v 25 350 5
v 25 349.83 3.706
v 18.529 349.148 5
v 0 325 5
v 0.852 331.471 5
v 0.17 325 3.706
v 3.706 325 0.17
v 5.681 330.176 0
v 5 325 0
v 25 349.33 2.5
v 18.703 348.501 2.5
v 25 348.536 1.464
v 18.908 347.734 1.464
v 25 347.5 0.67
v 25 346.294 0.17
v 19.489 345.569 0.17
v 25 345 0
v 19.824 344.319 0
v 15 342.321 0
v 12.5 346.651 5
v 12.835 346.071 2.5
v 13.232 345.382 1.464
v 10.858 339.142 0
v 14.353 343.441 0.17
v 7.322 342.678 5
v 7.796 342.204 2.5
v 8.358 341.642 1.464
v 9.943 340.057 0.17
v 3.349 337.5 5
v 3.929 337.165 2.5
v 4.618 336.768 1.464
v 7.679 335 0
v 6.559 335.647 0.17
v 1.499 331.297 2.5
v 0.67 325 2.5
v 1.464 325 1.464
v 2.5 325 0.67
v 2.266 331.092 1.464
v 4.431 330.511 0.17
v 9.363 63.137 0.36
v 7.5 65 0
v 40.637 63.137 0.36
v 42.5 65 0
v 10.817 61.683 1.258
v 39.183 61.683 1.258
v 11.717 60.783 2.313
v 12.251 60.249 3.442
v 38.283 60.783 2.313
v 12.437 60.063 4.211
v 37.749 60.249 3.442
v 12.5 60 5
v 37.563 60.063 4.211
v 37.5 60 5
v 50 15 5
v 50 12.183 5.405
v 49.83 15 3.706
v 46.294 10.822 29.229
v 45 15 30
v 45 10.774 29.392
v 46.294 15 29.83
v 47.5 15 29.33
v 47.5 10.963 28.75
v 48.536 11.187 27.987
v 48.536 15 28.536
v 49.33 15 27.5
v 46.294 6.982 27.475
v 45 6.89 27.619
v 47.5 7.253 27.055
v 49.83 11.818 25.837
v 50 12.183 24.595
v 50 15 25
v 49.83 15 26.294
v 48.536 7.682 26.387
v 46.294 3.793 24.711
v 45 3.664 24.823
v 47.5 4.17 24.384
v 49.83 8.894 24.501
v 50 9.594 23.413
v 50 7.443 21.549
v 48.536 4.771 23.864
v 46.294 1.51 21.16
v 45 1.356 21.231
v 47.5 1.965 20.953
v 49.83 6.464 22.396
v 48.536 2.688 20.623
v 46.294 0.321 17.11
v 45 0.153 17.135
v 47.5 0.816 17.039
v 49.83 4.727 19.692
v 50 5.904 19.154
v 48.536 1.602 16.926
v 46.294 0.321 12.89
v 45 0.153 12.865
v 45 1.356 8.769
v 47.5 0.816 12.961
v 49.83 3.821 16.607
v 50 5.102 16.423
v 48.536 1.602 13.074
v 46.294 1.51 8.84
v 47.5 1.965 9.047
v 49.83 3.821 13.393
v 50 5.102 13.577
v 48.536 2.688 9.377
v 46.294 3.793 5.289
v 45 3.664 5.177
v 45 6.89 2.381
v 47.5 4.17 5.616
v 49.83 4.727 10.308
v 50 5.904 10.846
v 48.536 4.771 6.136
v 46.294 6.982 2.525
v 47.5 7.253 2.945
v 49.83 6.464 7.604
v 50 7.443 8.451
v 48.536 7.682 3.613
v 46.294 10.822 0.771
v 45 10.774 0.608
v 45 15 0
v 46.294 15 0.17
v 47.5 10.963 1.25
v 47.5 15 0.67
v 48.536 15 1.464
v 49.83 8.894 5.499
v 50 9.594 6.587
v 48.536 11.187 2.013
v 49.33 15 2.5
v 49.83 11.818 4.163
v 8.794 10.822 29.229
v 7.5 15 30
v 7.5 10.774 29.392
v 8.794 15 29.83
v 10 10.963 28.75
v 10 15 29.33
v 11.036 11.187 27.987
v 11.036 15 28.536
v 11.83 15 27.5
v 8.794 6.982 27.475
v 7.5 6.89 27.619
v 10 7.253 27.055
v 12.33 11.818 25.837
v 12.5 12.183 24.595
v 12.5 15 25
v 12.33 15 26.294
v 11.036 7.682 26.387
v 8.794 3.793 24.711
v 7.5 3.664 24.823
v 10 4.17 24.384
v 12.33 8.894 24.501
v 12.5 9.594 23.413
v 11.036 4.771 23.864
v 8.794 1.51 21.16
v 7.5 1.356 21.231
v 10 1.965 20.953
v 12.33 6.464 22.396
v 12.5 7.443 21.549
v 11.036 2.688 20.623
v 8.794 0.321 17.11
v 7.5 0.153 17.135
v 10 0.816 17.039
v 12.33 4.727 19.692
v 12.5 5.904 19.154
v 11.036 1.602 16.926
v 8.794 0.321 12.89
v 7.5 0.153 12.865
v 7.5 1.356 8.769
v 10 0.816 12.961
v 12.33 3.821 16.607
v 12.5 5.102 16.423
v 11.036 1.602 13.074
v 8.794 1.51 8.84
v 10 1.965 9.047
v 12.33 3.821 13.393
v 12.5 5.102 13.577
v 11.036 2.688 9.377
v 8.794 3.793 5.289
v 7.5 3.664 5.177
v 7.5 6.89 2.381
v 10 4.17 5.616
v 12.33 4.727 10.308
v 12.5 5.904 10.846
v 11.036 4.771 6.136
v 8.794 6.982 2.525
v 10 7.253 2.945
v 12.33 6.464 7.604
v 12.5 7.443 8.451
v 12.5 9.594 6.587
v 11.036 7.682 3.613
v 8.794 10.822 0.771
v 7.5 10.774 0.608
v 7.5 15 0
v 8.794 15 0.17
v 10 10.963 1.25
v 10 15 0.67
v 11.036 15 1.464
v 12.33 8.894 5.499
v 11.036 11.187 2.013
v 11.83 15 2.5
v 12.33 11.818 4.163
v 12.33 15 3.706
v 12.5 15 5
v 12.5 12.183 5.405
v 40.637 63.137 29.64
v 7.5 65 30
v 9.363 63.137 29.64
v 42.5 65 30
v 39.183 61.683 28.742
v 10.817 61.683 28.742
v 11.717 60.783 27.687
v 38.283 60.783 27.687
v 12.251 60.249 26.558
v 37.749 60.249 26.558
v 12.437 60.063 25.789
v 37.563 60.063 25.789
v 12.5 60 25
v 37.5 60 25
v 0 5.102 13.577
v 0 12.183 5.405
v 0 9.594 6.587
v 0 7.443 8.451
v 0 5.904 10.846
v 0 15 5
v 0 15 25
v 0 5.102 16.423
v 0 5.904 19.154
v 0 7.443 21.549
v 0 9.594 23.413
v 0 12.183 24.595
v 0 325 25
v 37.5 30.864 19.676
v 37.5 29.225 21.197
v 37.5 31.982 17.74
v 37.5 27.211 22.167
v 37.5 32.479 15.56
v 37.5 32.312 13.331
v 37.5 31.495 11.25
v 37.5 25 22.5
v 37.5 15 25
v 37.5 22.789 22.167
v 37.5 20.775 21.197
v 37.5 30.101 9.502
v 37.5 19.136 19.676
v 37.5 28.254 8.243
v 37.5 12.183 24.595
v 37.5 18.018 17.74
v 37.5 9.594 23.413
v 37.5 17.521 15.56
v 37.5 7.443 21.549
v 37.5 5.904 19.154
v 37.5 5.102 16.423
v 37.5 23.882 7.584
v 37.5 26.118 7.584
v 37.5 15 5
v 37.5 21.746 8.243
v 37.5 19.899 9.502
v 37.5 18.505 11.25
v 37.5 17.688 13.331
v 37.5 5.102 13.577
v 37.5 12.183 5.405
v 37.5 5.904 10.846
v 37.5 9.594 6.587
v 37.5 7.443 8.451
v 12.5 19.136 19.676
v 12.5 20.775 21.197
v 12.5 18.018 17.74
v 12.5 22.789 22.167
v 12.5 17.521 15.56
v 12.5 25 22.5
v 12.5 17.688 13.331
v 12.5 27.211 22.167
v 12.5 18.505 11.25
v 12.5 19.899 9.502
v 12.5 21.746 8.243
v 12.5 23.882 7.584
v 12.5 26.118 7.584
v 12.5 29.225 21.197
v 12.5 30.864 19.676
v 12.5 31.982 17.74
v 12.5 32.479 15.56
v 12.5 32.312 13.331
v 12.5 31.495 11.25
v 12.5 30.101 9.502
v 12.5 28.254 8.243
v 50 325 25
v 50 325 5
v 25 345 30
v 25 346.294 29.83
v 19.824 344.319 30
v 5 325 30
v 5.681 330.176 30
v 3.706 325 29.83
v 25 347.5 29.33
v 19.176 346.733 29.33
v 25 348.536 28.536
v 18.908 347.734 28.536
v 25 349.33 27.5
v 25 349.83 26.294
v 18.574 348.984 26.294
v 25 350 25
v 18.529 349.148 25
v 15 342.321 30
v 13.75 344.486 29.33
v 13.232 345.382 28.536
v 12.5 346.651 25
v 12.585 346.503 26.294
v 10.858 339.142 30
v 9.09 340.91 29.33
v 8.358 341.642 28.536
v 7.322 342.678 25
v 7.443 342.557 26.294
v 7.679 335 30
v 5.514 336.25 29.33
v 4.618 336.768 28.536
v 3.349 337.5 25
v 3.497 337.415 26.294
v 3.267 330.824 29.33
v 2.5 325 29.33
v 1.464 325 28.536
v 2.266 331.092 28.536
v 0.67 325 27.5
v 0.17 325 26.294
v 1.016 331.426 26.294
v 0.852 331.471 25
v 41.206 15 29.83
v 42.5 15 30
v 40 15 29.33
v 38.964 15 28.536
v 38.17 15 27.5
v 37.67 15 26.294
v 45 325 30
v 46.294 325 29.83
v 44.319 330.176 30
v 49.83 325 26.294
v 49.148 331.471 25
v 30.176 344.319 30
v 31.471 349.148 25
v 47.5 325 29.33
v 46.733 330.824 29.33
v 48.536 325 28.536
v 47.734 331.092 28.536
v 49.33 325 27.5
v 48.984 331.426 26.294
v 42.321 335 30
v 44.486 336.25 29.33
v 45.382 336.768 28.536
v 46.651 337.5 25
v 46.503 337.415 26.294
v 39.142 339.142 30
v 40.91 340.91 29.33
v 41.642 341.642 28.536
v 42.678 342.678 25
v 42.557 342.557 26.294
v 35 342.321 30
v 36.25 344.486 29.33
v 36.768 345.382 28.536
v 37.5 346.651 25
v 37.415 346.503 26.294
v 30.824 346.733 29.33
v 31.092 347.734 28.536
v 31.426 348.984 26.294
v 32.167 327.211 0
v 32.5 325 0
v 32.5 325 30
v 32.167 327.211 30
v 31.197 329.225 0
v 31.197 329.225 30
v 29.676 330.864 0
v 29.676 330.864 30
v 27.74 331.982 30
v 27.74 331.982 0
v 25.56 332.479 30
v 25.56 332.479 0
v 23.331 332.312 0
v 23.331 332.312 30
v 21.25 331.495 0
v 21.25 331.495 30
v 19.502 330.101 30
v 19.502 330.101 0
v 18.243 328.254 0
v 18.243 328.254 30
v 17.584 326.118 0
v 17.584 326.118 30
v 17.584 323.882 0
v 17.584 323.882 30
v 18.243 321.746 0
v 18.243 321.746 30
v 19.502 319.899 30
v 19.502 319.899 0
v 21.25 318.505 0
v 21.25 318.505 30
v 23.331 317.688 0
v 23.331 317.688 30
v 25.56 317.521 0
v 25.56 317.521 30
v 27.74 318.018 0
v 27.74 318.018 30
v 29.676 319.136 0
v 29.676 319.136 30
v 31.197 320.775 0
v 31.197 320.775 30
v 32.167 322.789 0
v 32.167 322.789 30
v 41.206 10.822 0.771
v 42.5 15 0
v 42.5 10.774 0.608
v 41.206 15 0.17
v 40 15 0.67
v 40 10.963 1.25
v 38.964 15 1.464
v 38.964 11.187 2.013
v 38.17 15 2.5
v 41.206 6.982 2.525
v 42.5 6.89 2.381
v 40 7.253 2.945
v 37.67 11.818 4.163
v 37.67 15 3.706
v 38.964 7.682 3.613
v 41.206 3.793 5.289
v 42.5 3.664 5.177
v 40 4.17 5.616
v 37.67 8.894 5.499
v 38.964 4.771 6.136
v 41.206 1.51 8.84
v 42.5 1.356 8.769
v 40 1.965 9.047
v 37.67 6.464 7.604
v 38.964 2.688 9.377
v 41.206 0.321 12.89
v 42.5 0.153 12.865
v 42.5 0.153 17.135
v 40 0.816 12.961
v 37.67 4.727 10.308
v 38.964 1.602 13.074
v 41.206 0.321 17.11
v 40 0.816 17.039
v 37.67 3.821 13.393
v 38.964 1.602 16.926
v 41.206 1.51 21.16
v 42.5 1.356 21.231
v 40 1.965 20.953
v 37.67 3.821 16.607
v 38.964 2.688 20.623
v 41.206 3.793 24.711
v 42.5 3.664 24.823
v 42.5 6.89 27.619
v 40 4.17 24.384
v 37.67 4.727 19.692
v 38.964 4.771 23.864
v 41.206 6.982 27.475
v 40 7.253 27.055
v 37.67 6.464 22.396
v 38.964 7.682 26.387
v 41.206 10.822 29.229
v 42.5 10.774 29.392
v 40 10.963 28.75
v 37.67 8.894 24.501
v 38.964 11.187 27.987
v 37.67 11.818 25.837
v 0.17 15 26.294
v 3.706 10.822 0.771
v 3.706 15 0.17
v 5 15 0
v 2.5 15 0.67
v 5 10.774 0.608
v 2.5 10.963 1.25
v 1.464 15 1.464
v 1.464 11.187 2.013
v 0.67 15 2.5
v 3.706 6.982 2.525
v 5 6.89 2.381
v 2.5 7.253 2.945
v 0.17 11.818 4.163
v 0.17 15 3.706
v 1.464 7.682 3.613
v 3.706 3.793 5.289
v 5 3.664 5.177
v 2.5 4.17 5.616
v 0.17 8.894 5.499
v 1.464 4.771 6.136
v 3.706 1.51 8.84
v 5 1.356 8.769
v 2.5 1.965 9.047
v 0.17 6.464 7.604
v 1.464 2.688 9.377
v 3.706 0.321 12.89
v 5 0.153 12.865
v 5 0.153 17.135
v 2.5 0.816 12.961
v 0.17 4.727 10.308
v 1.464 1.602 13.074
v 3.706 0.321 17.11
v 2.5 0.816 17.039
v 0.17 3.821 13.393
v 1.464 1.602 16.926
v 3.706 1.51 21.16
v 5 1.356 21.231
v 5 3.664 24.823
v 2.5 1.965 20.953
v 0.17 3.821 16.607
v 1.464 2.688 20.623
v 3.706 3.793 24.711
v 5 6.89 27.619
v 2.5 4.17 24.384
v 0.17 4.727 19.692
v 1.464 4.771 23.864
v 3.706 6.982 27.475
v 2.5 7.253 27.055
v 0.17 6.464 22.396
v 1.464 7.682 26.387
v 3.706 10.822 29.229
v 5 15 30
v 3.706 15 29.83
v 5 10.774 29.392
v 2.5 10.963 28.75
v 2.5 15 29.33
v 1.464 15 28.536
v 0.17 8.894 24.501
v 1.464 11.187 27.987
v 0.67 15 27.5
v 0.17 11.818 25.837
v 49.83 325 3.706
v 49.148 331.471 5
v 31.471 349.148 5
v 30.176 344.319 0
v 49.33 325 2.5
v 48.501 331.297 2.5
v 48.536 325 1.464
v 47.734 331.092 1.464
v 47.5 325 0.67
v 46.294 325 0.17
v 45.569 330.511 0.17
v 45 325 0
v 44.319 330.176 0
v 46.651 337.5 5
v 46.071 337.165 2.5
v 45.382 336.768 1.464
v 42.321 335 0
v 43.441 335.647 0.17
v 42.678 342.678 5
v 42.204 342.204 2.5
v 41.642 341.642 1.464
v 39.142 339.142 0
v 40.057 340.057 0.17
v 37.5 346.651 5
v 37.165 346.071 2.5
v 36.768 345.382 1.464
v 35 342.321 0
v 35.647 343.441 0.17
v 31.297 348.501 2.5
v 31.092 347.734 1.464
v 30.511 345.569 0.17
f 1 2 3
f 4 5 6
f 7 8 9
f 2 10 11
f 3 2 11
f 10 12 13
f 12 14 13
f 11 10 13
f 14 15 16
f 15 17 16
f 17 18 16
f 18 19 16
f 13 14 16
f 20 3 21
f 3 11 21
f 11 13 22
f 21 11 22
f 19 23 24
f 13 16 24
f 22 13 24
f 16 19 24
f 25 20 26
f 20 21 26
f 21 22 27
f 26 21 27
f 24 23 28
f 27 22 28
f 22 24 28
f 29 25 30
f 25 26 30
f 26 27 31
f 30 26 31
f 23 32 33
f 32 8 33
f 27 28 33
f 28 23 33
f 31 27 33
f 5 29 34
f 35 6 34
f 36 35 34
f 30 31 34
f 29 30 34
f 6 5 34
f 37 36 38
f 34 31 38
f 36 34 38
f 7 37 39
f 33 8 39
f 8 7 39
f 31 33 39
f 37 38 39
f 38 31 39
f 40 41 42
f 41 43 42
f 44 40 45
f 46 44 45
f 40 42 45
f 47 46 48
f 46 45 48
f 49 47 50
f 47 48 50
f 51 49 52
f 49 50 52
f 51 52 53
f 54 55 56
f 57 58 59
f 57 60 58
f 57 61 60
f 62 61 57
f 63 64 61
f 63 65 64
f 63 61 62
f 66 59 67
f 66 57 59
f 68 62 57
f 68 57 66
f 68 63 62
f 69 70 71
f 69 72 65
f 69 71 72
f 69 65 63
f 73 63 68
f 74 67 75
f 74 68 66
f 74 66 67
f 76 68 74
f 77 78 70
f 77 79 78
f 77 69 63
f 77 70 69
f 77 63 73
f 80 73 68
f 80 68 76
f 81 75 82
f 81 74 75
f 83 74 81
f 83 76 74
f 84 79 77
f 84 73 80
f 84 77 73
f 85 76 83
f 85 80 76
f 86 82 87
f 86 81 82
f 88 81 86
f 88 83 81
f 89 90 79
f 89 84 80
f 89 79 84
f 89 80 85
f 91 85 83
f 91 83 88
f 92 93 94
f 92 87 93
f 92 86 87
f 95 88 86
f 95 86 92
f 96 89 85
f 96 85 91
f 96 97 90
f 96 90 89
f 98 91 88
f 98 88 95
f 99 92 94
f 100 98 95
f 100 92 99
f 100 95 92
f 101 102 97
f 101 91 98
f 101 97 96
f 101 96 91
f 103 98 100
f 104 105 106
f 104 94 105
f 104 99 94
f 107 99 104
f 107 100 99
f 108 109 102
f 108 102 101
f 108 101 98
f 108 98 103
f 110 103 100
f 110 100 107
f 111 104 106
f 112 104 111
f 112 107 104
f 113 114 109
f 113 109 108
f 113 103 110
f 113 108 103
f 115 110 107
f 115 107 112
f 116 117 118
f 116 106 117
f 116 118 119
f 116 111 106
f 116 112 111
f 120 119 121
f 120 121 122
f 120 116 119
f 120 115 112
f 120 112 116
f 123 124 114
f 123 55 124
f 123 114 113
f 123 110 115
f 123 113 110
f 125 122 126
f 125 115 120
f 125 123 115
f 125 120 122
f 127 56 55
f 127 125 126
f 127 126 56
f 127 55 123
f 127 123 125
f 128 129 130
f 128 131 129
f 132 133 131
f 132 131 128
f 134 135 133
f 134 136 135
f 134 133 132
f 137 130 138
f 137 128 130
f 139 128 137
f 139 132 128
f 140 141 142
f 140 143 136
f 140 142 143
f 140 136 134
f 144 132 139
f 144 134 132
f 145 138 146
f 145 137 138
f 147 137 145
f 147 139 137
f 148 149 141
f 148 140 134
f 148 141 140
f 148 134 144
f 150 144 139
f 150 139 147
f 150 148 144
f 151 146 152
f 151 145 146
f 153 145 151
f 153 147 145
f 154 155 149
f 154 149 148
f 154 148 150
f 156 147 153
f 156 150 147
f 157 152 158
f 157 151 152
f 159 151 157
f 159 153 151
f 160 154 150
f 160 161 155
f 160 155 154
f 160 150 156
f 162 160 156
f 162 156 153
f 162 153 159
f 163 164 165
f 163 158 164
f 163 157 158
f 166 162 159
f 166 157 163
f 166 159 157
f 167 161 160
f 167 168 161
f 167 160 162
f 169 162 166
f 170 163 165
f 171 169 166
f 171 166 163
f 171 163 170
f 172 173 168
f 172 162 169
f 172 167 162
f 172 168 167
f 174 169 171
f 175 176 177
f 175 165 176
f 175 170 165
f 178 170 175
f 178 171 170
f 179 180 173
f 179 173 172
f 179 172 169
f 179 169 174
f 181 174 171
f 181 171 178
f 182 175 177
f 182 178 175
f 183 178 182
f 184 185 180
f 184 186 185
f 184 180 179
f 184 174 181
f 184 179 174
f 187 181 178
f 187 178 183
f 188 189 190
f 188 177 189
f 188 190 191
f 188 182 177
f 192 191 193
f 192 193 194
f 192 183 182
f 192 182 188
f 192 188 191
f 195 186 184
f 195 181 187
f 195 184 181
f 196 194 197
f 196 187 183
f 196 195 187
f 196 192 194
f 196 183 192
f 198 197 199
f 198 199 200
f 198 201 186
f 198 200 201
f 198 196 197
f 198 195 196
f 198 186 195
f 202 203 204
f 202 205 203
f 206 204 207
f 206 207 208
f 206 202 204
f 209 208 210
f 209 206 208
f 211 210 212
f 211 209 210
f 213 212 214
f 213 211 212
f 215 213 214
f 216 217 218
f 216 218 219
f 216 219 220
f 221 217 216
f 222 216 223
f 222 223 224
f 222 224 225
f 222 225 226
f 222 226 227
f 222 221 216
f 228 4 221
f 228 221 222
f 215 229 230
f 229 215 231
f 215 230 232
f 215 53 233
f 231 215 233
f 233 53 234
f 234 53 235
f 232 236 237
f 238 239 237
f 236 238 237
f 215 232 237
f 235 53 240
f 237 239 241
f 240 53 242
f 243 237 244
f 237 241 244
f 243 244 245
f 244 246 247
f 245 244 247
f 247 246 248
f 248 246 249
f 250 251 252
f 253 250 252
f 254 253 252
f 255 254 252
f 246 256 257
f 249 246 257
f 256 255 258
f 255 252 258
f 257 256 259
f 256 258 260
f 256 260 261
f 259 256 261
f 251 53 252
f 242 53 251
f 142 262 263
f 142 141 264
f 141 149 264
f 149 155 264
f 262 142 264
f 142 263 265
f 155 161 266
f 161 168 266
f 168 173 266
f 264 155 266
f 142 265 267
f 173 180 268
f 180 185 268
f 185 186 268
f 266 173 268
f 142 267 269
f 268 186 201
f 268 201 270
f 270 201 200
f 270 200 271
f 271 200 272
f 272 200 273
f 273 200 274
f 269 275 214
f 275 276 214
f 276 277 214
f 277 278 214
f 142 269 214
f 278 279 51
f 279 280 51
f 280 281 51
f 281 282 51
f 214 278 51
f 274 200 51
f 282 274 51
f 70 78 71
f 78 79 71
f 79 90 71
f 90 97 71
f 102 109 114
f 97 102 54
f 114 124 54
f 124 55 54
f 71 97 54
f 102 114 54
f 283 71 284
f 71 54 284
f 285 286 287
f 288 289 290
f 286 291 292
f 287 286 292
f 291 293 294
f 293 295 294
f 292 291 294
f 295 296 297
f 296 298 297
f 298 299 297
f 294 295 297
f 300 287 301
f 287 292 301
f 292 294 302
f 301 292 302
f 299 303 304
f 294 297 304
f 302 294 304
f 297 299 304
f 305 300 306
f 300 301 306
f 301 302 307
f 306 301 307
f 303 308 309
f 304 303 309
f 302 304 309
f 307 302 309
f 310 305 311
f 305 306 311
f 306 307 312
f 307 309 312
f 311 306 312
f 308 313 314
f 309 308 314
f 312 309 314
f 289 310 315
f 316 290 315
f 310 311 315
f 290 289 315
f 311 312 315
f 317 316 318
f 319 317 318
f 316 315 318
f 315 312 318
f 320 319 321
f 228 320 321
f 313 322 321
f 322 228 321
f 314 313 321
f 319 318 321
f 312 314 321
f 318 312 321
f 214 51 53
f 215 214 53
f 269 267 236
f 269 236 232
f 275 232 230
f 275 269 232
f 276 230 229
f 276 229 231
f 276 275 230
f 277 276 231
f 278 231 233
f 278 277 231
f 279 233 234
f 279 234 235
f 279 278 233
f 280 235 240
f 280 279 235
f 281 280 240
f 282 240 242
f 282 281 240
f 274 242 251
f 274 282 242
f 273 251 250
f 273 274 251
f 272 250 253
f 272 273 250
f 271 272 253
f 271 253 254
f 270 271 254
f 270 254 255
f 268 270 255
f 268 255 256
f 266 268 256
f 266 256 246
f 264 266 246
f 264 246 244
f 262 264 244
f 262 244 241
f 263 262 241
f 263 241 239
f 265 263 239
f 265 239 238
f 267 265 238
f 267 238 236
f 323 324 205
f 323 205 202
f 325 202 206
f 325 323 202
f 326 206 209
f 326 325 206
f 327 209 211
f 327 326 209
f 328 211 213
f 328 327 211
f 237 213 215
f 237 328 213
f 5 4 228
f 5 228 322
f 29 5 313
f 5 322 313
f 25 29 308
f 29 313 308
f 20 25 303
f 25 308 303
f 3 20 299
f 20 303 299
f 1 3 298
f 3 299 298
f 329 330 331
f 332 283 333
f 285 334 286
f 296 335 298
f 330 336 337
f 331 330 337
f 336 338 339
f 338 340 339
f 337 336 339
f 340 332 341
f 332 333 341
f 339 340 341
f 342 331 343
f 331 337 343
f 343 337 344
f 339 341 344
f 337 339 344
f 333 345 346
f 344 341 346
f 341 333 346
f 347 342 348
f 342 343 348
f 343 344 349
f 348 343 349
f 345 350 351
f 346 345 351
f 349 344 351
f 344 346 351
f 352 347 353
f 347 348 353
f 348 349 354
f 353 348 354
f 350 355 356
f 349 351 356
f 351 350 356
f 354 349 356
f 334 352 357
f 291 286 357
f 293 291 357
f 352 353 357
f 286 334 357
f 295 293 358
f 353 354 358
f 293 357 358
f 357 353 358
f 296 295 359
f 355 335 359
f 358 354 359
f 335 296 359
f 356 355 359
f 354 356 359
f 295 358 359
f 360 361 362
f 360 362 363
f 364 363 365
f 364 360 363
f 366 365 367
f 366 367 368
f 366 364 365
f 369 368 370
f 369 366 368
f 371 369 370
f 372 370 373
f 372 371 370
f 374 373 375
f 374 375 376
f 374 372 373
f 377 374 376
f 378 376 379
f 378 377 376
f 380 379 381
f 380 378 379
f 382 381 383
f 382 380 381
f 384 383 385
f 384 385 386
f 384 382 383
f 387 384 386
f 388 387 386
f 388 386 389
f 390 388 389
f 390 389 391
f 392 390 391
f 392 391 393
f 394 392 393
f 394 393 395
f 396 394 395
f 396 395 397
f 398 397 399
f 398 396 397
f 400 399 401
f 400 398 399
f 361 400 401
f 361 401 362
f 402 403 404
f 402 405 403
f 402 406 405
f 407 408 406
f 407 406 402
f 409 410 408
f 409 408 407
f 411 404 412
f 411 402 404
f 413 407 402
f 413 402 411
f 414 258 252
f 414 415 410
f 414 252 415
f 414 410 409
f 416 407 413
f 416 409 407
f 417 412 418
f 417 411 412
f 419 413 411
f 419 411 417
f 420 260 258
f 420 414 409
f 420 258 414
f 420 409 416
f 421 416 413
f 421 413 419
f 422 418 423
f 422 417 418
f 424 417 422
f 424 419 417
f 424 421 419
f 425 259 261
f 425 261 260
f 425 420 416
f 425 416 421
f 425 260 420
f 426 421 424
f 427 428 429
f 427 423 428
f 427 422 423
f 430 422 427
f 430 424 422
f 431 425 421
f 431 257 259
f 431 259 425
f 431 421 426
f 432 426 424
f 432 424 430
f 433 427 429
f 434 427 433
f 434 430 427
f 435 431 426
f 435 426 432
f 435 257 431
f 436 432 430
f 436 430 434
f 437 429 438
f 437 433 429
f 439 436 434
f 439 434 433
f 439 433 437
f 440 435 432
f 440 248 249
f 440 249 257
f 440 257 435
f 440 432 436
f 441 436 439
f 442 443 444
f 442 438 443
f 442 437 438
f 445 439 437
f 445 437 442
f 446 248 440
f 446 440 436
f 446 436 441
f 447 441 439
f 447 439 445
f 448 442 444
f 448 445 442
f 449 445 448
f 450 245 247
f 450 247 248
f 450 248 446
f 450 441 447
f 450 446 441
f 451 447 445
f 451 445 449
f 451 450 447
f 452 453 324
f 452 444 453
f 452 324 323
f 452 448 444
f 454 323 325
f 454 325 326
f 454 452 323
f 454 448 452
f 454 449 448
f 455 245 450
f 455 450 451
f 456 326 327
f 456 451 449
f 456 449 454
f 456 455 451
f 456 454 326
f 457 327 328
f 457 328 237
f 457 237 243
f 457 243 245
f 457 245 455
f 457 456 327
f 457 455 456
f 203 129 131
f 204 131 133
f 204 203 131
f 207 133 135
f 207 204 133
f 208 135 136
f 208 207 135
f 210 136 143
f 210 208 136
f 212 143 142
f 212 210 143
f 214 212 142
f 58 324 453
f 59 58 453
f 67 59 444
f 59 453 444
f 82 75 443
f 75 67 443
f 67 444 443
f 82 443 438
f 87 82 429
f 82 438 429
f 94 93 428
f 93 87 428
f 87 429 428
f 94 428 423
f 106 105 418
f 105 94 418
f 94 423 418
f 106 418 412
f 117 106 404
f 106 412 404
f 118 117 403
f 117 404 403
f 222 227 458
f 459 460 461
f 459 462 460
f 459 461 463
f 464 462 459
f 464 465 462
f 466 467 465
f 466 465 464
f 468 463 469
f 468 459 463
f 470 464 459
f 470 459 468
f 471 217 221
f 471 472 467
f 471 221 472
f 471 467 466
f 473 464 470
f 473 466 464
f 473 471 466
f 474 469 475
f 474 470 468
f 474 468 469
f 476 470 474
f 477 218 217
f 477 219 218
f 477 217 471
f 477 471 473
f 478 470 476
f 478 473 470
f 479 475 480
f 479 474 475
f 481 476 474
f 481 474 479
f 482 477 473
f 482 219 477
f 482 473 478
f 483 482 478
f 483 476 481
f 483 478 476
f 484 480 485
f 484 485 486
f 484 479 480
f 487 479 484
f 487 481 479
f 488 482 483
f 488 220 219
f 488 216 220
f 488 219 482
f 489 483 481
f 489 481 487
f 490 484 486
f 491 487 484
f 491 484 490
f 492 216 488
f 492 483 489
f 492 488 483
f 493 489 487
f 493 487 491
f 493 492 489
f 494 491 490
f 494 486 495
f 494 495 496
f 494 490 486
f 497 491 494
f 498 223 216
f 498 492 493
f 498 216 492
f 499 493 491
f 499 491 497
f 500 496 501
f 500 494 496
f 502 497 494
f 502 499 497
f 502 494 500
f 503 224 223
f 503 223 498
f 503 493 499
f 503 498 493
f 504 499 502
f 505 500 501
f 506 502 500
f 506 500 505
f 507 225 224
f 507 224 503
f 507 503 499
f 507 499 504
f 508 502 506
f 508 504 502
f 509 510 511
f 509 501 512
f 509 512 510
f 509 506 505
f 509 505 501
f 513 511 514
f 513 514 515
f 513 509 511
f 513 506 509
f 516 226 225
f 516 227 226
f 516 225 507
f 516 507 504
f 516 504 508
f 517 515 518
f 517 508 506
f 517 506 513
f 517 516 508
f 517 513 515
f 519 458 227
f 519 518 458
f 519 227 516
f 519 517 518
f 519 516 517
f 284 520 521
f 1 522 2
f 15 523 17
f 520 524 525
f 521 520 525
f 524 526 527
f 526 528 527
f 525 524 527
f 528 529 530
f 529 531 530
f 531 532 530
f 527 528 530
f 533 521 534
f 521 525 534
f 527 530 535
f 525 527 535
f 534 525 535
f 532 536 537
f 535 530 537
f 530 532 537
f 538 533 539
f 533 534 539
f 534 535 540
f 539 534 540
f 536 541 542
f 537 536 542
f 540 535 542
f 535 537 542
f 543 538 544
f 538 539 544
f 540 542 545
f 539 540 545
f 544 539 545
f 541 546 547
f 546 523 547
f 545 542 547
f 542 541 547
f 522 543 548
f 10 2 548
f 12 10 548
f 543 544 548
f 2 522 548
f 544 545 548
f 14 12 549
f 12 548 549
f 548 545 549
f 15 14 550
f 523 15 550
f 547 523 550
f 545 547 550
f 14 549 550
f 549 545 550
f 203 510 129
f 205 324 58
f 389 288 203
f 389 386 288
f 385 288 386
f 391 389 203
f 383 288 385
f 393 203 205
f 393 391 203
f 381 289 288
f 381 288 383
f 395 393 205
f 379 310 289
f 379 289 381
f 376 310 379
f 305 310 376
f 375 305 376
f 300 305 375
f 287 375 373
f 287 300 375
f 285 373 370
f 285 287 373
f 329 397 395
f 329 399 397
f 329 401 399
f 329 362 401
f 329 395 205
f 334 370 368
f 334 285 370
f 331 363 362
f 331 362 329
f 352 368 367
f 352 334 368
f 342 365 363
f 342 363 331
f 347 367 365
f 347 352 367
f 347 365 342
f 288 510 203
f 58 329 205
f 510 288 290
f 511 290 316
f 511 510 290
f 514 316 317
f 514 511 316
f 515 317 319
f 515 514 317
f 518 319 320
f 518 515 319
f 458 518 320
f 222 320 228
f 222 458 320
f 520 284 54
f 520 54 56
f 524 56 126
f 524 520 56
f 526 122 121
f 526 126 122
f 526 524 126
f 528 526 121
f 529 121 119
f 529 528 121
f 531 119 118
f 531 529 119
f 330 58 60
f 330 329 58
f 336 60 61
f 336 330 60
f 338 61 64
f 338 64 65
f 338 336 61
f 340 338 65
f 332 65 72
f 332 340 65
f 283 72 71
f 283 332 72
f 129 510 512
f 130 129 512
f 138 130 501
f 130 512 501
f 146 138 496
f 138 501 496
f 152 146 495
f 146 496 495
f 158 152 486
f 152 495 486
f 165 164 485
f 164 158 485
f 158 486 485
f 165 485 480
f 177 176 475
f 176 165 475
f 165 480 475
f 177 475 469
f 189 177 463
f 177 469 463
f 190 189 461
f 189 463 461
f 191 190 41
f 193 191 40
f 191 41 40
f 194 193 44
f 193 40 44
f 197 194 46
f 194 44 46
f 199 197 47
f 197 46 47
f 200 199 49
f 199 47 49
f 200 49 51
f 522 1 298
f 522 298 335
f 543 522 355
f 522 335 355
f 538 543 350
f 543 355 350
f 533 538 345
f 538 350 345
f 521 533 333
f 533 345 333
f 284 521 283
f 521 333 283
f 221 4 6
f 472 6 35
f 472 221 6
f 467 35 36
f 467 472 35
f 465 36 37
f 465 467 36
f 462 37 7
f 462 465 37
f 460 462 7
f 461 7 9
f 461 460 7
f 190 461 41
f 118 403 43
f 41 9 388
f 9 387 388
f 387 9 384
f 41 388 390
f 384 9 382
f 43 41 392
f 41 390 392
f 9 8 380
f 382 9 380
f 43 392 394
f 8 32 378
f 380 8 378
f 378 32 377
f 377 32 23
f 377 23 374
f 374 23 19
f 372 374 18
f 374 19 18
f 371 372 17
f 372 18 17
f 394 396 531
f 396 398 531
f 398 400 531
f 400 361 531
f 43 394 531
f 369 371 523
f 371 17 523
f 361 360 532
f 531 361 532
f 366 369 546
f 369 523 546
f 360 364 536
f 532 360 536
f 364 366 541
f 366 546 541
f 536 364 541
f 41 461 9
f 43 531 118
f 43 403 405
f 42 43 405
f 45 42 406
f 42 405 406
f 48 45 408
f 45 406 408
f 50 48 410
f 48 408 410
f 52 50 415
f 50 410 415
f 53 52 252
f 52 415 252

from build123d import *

# Parameters (mm, degrees)
CROQUIS1_R              = 7.5
SALIENTE_EXTRUIR2_DEPTH = 30
REDONDEO1_R             = 25
CROQUIS2_R              = 7.5
SALIENTE_EXTRUIR3_DEPTH = 50
REDONDEO2_R             = 5
REDONDEO4_R             = 15


# Some blends are built 0.0001 mm under size
with BuildPart() as part:
    # Croquis1 → Saliente-Extruir2 (new body)
    with BuildSketch(Plane.XY):
        Polygon((12.5, 0), (12.5, 60), (37.5, 60), (37.5, 0), (50, 0), (50, 350), (0, 350), (0, 0), align=None)
        with Locations((25, 325)):
            Circle(CROQUIS1_R, mode=Mode.SUBTRACT)
    extrude(amount=SALIENTE_EXTRUIR2_DEPTH)

    # Redondeo1
    redondeo1_edges = [part.edges().sort_by_distance(p)[0] for p in [
        (0, 350, 15),
        (50, 350, 15),
    ]]
    fillet(redondeo1_edges, radius=REDONDEO1_R - 0.0001)  # a hair under: the kernel refuses the full size

    # Croquis2 → Saliente-Extruir3 (add)
    with BuildSketch(Plane.ZY):
        with Locations((15, 25)):
            Circle(CROQUIS2_R)
    extrude(amount=-SALIENTE_EXTRUIR3_DEPTH)

    # Redondeo2
    redondeo2_edges = [part.edges().sort_by_distance(p)[0] for p in [
        (12.5, 30, 30),
        (25, 60, 30),
        (50, 0, 15),
        (37.5, 0, 15),
        (12.5, 0, 15),
        (0, 0, 15),
        (37.5, 30, 30),
        (50, 162.50005, 30),
        (0, 162.50005, 0),
        (0, 162.50005, 30),
        (42.677698819, 342.677698819, 0),
        (7.322301181, 342.677698819, 0),
        (42.677698819, 342.677698819, 30),
        (7.322301181, 342.677698819, 30),
        (50, 162.50005, 0),
        (37.5, 30, 0),
        (25, 60, 0),
        (12.5, 30, 0),
    ]]
    fillet(redondeo2_edges, radius=REDONDEO2_R)

    # Redondeo4
    # the kernel refuses this fillet: 15 mm, written as the material it takes off along each edge
    with BuildSketch(Plane(origin=(50, 15, 15), x_dir=(0, -1, 0), z_dir=(0, 0, 1))) as redondeo4_piece_1:
        with BuildLine():
            CenterArc((10, -5), 5, 0, 90)
            Line((15, -5), (15, 0))
            Line((15, 0), (10, 0))
        make_face()
    revolve(axis=Axis((50, 15, 15), (1, 0, 0)), revolution_arc=90, mode=Mode.SUBTRACT)
    with BuildSketch(Plane(origin=(37.5, 15, 15), x_dir=(0, 0, -1), z_dir=(0, 1, 0))) as redondeo4_piece_2:
        with BuildLine():
            CenterArc((10, -5), 5, 0, 90)
            Line((15, -5), (15, 0))
            Line((15, 0), (10, 0))
        make_face()
    revolve(axis=Axis((37.5, 15, 15), (-1, 0, 0)), revolution_arc=90, mode=Mode.SUBTRACT)
    with BuildSketch(Plane(origin=(12.5, 15, 15), x_dir=(0, -1, 0), z_dir=(0, 0, 1))) as redondeo4_piece_3:
        with BuildLine():
            CenterArc((10, -5), 5, 0, 90)
            Line((15, -5), (15, 0))
            Line((15, 0), (10, 0))
        make_face()
    revolve(axis=Axis((12.5, 15, 15), (1, 0, 0)), revolution_arc=90, mode=Mode.SUBTRACT)
    with BuildSketch(Plane(origin=(0, 15, 15), x_dir=(0, 0, -1), z_dir=(0, 1, 0))) as redondeo4_piece_4:
        with BuildLine():
            CenterArc((10, -5), 5, 0, 90)
            Line((15, -5), (15, 0))
            Line((15, 0), (10, 0))
        make_face()
    revolve(axis=Axis((0, 15, 15), (-1, 0, 0)), revolution_arc=90, mode=Mode.SUBTRACT)
    with BuildSketch(Plane(origin=(12.5, 15, 15), x_dir=(0, 0, 1), z_dir=(0, 1, 0))) as redondeo4_piece_5:
        with BuildLine():
            CenterArc((10, -5), 5, 0, 90)
            Line((15, -5), (15, 0))
            Line((15, 0), (10, 0))
        make_face()
    revolve(axis=Axis((12.5, 15, 15), (1, 0, 0)), revolution_arc=90, mode=Mode.SUBTRACT)
    with BuildSketch(Plane(origin=(0, 15, 15), x_dir=(0, -1, 0), z_dir=(0, 0, -1))) as redondeo4_piece_6:
        with BuildLine():
            CenterArc((10, -5), 5, 0, 90)
            Line((15, -5), (15, 0))
            Line((15, 0), (10, 0))
        make_face()
    revolve(axis=Axis((0, 15, 15), (-1, 0, 0)), revolution_arc=90, mode=Mode.SUBTRACT)
    with BuildSketch(Plane(origin=(50, 15, 15), x_dir=(0, 0, 1), z_dir=(0, 1, 0))) as redondeo4_piece_7:
        with BuildLine():
            CenterArc((10, -5), 5, 0, 90)
            Line((15, -5), (15, 0))
            Line((15, 0), (10, 0))
        make_face()
    revolve(axis=Axis((50, 15, 15), (1, 0, 0)), revolution_arc=90, mode=Mode.SUBTRACT)
    with BuildSketch(Plane(origin=(37.5, 15, 15), x_dir=(0, -1, 0), z_dir=(0, 0, -1))) as redondeo4_piece_8:
        with BuildLine():
            CenterArc((10, -5), 5, 0, 90)
            Line((15, -5), (15, 0))
            Line((15, 0), (10, 0))
        make_face()
    revolve(axis=Axis((37.5, 15, 15), (-1, 0, 0)), revolution_arc=90, mode=Mode.SUBTRACT)
    with BuildSketch(Plane(origin=(37.5, 0, 30), x_dir=(0, 1, 0), z_dir=(1, 0, 0)), Plane(origin=(0, 0, 30), x_dir=(0, 1, 0), z_dir=(1, 0, 0))) as redondeo4_piece_9:
        with BuildLine():
            CenterArc((REDONDEO4_R, -REDONDEO4_R), REDONDEO4_R, 90, 90)
            Line((0, -REDONDEO4_R), (0, 0))
            Line((0, 0), (REDONDEO4_R, 0))
        make_face()
    extrude(amount=12.5, mode=Mode.SUBTRACT)
    with BuildSketch(Plane(origin=(0, 0, 0), x_dir=(0, 1, 0), z_dir=(1, 0, 0)), Plane(origin=(37.5, 0, 0), x_dir=(0, 1, 0), z_dir=(1, 0, 0))) as redondeo4_piece_10:
        with BuildLine():
            CenterArc((REDONDEO4_R, REDONDEO4_R), REDONDEO4_R, 180, 90)
            Line((0, REDONDEO4_R), (0, 0))
            Line((0, 0), (REDONDEO4_R, 0))
        make_face()
    extrude(amount=12.5, mode=Mode.SUBTRACT)


solid = part.part
